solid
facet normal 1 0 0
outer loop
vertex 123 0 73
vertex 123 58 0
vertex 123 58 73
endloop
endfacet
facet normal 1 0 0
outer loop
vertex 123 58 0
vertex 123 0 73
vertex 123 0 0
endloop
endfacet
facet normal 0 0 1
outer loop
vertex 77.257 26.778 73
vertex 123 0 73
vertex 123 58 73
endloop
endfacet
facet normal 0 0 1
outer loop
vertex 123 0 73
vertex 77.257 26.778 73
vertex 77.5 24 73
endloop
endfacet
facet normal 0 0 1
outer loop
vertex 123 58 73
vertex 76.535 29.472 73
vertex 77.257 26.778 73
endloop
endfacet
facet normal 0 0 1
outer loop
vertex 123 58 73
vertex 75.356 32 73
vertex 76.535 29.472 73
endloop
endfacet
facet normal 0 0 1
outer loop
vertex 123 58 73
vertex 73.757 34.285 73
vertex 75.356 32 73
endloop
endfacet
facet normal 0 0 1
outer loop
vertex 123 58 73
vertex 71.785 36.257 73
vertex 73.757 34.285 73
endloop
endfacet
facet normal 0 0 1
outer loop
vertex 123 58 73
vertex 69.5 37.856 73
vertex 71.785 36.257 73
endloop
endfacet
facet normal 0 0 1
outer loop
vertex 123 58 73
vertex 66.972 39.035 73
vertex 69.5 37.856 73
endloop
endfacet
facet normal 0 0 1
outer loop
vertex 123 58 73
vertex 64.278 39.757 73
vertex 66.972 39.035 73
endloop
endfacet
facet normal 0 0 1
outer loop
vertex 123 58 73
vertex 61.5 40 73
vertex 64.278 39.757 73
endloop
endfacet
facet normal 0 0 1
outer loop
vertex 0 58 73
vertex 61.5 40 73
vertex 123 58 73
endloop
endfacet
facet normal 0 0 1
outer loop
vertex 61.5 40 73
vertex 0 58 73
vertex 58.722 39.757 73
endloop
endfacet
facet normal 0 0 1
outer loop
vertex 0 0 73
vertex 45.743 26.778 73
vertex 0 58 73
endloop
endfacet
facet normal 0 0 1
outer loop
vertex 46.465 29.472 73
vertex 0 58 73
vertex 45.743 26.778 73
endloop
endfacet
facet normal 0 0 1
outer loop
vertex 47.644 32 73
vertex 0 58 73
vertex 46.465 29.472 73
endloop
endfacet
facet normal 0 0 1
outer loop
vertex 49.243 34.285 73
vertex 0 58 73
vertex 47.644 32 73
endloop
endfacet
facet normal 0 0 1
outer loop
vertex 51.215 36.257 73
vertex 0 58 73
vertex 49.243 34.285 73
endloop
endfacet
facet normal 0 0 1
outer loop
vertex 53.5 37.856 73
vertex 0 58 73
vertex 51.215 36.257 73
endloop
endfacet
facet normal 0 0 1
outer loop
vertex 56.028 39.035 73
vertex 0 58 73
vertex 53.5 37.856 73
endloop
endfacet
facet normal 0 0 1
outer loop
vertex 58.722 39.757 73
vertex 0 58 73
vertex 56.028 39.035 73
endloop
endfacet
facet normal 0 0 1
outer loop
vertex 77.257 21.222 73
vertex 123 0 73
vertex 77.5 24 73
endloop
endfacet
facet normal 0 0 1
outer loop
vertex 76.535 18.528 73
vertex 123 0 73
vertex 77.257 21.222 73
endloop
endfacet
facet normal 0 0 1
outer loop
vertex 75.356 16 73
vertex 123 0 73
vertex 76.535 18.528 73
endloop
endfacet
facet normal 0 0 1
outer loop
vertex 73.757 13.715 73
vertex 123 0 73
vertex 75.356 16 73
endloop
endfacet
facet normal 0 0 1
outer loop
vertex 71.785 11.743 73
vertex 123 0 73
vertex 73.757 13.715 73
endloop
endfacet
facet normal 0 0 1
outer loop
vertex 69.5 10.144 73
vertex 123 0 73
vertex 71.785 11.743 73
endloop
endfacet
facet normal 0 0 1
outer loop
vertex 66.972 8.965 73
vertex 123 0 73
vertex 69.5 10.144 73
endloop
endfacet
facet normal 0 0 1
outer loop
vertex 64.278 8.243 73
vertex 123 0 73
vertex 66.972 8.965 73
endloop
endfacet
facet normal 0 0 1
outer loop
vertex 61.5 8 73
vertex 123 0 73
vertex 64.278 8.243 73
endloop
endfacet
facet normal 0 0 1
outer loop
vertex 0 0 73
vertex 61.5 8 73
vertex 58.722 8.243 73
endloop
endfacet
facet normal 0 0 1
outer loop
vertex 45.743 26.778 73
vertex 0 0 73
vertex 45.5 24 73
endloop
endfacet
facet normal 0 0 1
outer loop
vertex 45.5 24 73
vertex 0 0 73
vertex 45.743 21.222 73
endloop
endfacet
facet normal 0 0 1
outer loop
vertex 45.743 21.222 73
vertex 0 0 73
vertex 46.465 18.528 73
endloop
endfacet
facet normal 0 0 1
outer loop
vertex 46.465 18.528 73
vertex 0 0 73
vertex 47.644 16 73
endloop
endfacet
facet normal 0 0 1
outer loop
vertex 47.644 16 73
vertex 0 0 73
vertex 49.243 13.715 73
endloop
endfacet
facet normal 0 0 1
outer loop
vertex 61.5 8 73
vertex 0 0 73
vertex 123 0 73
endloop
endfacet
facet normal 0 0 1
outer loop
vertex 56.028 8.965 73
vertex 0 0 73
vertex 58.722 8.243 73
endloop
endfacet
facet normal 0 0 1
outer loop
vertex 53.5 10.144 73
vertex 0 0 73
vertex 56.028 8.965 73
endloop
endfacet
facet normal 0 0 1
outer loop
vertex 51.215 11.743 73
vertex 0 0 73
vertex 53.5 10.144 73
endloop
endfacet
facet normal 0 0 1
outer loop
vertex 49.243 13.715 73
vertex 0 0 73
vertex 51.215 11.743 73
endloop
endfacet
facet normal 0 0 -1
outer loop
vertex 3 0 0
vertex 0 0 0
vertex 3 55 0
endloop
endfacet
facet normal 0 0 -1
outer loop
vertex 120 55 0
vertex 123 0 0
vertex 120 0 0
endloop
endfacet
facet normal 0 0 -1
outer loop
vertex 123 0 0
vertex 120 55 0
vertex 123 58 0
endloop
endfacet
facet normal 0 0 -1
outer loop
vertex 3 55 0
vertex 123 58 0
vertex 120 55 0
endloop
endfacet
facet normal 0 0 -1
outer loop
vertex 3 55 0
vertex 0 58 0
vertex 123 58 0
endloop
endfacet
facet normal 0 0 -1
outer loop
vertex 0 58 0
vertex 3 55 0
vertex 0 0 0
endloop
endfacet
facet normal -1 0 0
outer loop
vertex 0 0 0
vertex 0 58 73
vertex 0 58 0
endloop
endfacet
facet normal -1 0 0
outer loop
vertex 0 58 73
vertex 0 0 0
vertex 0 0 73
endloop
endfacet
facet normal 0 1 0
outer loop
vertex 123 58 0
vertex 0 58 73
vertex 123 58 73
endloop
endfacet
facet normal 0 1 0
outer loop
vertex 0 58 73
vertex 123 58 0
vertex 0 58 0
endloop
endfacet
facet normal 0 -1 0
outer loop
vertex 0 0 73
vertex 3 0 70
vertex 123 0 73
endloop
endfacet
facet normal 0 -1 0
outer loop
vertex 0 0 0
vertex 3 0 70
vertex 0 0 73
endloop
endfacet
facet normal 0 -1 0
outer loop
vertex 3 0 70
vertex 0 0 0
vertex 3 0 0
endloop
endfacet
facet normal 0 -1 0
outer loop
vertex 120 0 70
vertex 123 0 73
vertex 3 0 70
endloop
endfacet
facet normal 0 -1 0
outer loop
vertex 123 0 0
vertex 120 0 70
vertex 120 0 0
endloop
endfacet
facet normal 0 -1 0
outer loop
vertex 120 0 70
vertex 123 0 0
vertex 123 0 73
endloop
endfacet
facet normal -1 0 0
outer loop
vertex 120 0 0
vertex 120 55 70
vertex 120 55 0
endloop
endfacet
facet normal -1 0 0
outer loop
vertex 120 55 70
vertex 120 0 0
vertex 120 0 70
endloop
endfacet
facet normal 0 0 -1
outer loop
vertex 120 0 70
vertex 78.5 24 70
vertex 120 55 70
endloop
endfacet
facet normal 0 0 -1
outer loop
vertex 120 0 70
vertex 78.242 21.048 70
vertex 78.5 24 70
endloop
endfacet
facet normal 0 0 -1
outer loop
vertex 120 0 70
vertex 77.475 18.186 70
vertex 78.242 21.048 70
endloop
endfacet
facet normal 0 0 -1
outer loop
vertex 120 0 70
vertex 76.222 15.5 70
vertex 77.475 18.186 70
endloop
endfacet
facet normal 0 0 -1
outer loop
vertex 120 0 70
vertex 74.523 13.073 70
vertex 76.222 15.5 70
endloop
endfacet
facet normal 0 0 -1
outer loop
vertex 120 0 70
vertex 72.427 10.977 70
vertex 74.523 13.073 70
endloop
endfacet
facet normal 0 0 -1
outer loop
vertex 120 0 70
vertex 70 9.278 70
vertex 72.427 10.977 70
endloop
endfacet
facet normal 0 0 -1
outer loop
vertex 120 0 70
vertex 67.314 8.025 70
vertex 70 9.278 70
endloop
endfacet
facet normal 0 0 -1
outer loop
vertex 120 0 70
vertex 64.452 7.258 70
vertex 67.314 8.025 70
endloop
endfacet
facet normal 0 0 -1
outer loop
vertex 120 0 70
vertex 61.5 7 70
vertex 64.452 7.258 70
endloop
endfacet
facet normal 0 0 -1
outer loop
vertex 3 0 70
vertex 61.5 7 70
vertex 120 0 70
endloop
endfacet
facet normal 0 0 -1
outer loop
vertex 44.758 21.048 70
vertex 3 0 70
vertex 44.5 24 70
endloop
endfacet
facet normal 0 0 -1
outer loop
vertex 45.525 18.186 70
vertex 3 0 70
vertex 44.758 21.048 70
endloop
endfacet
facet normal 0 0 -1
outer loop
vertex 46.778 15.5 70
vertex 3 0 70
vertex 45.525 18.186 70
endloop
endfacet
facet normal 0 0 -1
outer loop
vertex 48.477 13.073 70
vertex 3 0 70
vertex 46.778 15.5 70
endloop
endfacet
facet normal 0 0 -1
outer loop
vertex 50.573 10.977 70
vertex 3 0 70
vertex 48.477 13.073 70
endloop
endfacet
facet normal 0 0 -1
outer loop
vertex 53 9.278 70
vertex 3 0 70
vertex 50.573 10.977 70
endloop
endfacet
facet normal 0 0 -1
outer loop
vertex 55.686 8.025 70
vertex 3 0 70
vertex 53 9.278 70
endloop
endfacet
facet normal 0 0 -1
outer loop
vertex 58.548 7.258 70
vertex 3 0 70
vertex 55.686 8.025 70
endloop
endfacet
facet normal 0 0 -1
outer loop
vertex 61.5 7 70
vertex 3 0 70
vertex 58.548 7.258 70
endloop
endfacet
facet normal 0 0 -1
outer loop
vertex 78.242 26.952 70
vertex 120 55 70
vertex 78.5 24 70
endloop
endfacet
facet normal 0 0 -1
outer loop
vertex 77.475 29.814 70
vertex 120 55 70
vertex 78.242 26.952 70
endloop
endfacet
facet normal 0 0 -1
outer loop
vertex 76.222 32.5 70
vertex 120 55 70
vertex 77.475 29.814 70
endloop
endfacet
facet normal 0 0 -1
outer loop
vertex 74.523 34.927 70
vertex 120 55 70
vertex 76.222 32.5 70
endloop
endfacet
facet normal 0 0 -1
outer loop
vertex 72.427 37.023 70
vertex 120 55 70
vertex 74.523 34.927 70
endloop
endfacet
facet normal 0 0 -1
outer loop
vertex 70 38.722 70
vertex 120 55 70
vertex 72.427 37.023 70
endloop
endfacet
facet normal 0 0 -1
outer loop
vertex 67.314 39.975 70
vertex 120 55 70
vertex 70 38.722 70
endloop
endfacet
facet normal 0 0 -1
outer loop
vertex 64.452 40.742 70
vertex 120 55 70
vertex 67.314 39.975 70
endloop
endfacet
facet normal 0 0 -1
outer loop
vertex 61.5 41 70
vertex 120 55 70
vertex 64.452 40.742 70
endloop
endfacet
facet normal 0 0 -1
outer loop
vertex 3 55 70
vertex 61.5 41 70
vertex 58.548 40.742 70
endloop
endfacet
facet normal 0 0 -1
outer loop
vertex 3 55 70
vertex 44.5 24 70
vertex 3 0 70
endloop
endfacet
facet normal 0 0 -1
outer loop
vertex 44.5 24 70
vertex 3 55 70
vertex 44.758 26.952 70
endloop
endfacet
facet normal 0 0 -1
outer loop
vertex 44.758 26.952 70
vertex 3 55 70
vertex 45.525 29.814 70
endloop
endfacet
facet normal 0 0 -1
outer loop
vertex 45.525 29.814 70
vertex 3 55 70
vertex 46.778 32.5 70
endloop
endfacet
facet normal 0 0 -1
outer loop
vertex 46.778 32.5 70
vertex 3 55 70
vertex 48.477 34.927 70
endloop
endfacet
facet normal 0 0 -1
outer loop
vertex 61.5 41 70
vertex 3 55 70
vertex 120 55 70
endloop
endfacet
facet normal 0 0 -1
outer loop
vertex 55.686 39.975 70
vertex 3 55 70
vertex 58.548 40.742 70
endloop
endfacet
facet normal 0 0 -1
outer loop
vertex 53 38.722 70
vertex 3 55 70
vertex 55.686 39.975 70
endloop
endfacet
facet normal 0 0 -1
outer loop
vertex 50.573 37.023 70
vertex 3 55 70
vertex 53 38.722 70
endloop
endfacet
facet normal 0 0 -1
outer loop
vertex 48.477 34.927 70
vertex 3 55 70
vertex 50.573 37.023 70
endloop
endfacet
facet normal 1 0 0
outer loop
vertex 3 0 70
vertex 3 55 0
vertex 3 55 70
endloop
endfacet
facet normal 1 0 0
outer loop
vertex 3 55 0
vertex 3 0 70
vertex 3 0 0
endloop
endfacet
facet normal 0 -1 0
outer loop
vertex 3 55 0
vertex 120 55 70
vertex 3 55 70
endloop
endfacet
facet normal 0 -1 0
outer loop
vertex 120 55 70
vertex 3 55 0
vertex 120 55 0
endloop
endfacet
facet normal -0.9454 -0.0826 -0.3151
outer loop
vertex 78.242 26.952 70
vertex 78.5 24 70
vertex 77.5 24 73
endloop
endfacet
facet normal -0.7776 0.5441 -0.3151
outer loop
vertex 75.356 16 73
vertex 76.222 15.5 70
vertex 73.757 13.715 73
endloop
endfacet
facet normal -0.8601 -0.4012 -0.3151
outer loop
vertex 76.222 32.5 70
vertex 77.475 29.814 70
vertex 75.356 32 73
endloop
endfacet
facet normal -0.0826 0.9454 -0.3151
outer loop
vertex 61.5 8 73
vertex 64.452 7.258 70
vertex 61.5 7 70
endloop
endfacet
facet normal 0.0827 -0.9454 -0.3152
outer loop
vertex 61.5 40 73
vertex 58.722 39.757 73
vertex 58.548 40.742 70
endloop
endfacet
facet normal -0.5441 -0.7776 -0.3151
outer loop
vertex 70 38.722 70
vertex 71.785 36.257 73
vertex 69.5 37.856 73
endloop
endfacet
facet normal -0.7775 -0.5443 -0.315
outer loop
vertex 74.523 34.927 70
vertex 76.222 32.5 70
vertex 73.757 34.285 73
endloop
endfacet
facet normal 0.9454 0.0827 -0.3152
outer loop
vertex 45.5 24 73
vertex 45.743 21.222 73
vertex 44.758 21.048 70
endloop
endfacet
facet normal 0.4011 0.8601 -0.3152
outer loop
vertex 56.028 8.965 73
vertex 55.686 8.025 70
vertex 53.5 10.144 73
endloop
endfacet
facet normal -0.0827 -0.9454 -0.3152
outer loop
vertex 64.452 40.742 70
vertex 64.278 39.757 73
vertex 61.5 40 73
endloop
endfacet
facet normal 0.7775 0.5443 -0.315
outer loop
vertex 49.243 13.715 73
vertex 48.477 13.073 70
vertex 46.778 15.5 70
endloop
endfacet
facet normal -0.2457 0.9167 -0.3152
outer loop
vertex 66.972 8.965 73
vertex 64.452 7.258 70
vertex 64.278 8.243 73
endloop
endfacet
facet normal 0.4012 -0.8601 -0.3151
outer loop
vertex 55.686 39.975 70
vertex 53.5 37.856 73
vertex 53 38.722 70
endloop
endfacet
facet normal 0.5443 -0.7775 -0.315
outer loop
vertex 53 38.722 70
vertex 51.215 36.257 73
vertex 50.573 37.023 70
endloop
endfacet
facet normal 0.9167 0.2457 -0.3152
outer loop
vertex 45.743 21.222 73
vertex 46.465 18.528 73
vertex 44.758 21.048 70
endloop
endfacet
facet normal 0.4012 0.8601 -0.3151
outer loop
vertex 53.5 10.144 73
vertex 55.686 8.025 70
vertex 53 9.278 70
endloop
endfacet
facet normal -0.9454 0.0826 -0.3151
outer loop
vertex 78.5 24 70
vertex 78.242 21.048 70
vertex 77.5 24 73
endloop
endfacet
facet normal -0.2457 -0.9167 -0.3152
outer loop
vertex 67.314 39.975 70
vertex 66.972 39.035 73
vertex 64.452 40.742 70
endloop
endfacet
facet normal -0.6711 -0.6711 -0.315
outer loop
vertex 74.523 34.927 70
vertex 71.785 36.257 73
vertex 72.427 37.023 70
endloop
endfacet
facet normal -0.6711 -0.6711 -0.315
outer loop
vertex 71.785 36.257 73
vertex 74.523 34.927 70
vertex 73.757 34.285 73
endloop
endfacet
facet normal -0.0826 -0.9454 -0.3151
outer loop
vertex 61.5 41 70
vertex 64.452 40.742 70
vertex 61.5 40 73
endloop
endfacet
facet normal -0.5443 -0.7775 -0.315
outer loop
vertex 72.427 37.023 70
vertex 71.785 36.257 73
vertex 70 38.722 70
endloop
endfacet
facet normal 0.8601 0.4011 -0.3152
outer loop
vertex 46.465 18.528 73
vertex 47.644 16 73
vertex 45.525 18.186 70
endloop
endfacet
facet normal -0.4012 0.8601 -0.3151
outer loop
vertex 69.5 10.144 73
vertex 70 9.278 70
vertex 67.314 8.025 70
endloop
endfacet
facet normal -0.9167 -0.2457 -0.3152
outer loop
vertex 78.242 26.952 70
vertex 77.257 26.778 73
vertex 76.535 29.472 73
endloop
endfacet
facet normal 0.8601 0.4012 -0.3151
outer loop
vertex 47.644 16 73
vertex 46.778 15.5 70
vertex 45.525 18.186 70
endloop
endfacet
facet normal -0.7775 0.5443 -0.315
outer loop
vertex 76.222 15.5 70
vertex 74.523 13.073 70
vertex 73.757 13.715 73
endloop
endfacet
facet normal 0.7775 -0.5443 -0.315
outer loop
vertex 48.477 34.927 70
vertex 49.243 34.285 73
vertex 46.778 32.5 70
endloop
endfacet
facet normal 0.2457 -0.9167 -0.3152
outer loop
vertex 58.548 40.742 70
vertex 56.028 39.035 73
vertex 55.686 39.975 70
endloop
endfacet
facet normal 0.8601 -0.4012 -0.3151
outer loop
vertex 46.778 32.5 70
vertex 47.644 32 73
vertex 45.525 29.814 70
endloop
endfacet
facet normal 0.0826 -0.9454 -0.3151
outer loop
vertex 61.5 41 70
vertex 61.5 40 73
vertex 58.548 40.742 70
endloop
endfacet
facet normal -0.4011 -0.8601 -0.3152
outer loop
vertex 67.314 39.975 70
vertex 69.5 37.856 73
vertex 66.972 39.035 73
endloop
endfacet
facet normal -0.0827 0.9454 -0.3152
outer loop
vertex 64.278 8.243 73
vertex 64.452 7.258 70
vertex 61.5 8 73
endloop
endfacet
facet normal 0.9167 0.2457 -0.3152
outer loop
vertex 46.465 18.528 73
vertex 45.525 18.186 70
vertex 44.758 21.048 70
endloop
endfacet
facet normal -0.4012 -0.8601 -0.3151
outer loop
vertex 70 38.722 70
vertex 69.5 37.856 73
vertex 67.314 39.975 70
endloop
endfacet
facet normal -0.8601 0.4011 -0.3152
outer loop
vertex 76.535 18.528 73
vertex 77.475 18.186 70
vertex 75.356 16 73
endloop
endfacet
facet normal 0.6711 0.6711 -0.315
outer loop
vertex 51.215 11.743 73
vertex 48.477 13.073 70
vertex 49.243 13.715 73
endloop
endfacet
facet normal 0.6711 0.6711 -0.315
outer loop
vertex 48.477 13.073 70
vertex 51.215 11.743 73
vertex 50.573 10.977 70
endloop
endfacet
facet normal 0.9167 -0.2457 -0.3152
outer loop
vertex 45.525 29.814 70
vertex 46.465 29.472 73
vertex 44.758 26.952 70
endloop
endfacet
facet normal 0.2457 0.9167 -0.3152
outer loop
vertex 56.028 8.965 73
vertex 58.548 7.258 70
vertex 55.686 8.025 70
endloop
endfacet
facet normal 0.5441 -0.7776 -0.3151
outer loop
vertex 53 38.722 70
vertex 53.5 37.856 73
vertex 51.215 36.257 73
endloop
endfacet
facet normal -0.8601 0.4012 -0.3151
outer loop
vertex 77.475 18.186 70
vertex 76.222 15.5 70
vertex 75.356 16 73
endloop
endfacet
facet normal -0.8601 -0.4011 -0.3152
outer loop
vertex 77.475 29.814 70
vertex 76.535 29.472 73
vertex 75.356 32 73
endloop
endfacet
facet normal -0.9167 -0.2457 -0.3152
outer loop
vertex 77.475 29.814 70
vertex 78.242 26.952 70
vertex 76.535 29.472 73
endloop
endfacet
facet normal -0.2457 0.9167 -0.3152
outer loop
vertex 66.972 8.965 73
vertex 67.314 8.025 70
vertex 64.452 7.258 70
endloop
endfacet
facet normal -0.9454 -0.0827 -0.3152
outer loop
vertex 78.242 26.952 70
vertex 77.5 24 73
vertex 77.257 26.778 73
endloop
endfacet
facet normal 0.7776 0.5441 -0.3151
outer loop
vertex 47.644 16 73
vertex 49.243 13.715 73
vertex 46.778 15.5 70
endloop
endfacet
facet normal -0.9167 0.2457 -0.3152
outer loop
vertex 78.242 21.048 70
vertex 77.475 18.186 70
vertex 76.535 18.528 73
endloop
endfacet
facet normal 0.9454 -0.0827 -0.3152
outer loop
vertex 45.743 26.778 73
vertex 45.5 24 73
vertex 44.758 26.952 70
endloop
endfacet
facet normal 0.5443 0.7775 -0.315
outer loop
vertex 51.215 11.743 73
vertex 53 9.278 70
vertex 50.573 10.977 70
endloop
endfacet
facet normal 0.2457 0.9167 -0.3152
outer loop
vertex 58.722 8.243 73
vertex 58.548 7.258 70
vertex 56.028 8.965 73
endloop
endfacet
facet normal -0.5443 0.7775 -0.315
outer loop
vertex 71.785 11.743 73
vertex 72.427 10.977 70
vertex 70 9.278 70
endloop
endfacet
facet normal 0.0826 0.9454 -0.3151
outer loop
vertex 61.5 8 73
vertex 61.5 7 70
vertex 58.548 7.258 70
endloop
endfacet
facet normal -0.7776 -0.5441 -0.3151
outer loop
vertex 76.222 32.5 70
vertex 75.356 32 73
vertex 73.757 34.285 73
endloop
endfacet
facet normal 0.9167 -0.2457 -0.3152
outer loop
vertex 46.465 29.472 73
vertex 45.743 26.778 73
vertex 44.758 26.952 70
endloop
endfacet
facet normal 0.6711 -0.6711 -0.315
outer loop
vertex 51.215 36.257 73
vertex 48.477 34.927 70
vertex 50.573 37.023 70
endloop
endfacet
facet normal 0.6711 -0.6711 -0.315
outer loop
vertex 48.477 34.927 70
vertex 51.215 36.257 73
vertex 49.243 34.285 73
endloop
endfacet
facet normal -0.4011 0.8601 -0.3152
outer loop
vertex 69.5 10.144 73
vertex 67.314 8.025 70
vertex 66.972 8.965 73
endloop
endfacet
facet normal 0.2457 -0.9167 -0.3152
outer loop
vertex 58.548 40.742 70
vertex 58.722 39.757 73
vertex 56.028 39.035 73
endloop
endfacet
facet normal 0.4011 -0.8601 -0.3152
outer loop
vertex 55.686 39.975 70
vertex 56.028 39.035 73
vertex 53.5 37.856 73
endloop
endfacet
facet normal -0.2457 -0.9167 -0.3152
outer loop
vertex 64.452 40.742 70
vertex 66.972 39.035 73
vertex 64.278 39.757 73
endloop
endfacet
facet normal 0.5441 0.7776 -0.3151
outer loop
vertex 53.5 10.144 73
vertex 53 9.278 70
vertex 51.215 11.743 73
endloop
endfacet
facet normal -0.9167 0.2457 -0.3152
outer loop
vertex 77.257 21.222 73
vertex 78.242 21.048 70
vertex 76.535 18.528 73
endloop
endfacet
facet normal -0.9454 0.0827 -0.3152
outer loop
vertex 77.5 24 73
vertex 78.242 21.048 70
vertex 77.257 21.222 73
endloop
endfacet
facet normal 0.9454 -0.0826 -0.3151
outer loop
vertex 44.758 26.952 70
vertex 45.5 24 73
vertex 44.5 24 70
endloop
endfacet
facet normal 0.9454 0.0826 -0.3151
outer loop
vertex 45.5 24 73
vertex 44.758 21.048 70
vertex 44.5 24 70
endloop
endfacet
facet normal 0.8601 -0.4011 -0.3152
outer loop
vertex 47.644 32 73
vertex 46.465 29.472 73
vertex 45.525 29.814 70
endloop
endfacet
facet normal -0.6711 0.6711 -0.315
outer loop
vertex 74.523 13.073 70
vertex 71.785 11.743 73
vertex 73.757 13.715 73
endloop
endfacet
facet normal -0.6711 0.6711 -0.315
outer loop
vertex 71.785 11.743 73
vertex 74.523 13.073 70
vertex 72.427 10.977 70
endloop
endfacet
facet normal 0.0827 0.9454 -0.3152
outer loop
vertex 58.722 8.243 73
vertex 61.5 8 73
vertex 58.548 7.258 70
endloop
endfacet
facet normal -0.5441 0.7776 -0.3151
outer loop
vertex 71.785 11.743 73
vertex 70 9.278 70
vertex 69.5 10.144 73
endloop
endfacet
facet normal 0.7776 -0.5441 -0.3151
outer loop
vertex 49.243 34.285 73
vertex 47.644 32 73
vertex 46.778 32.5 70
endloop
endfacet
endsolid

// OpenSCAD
// speaker holder for top of couch arm
//20210522 jkl

draftingFNs = 36;
renderFNs = 180;
$fn = draftingFNs;

minkRad = 1;

couchWidth = 115 + minkRad*2; //actual around 110-120mm, depending on squish of couch cushioning
holderDepth = 55;
holderBackHeight = 70; //maybe 50 coudl work, but 70 first try
//holderSideHeight = 60;

wallThickness = 3;


//speaker stand is 30mm fornt to back for support leg, 25mm side to side
speakerHoleRad = 15 + minkRad;
speakerHoleOffset = 15;

//minkowski(){
    difference(){
        //exterior walls
            cube([couchWidth+(wallThickness*2),holderDepth+wallThickness,holderBackHeight+wallThickness]);
        
        //remove interior void and front & bottom walls
        translate([wallThickness,0,0]){
            cube([couchWidth,holderDepth,holderBackHeight]);
        }
        
        //circle for speaker holder
        translate([couchWidth/2+wallThickness,holderDepth-(speakerHoleOffset+speakerHoleRad),holderBackHeight]){
            cylinder(wallThickness,speakerHoleRad+1,speakerHoleRad); //bottom slightly bigger to cinch down on stand?
        }
    }
    
    //round it all
//    sphere(minkRad);
//}

//
//linear_extrude(height = 2){
//    difference(){
//        circle(17);
//        circle(15);
//    }
//}
